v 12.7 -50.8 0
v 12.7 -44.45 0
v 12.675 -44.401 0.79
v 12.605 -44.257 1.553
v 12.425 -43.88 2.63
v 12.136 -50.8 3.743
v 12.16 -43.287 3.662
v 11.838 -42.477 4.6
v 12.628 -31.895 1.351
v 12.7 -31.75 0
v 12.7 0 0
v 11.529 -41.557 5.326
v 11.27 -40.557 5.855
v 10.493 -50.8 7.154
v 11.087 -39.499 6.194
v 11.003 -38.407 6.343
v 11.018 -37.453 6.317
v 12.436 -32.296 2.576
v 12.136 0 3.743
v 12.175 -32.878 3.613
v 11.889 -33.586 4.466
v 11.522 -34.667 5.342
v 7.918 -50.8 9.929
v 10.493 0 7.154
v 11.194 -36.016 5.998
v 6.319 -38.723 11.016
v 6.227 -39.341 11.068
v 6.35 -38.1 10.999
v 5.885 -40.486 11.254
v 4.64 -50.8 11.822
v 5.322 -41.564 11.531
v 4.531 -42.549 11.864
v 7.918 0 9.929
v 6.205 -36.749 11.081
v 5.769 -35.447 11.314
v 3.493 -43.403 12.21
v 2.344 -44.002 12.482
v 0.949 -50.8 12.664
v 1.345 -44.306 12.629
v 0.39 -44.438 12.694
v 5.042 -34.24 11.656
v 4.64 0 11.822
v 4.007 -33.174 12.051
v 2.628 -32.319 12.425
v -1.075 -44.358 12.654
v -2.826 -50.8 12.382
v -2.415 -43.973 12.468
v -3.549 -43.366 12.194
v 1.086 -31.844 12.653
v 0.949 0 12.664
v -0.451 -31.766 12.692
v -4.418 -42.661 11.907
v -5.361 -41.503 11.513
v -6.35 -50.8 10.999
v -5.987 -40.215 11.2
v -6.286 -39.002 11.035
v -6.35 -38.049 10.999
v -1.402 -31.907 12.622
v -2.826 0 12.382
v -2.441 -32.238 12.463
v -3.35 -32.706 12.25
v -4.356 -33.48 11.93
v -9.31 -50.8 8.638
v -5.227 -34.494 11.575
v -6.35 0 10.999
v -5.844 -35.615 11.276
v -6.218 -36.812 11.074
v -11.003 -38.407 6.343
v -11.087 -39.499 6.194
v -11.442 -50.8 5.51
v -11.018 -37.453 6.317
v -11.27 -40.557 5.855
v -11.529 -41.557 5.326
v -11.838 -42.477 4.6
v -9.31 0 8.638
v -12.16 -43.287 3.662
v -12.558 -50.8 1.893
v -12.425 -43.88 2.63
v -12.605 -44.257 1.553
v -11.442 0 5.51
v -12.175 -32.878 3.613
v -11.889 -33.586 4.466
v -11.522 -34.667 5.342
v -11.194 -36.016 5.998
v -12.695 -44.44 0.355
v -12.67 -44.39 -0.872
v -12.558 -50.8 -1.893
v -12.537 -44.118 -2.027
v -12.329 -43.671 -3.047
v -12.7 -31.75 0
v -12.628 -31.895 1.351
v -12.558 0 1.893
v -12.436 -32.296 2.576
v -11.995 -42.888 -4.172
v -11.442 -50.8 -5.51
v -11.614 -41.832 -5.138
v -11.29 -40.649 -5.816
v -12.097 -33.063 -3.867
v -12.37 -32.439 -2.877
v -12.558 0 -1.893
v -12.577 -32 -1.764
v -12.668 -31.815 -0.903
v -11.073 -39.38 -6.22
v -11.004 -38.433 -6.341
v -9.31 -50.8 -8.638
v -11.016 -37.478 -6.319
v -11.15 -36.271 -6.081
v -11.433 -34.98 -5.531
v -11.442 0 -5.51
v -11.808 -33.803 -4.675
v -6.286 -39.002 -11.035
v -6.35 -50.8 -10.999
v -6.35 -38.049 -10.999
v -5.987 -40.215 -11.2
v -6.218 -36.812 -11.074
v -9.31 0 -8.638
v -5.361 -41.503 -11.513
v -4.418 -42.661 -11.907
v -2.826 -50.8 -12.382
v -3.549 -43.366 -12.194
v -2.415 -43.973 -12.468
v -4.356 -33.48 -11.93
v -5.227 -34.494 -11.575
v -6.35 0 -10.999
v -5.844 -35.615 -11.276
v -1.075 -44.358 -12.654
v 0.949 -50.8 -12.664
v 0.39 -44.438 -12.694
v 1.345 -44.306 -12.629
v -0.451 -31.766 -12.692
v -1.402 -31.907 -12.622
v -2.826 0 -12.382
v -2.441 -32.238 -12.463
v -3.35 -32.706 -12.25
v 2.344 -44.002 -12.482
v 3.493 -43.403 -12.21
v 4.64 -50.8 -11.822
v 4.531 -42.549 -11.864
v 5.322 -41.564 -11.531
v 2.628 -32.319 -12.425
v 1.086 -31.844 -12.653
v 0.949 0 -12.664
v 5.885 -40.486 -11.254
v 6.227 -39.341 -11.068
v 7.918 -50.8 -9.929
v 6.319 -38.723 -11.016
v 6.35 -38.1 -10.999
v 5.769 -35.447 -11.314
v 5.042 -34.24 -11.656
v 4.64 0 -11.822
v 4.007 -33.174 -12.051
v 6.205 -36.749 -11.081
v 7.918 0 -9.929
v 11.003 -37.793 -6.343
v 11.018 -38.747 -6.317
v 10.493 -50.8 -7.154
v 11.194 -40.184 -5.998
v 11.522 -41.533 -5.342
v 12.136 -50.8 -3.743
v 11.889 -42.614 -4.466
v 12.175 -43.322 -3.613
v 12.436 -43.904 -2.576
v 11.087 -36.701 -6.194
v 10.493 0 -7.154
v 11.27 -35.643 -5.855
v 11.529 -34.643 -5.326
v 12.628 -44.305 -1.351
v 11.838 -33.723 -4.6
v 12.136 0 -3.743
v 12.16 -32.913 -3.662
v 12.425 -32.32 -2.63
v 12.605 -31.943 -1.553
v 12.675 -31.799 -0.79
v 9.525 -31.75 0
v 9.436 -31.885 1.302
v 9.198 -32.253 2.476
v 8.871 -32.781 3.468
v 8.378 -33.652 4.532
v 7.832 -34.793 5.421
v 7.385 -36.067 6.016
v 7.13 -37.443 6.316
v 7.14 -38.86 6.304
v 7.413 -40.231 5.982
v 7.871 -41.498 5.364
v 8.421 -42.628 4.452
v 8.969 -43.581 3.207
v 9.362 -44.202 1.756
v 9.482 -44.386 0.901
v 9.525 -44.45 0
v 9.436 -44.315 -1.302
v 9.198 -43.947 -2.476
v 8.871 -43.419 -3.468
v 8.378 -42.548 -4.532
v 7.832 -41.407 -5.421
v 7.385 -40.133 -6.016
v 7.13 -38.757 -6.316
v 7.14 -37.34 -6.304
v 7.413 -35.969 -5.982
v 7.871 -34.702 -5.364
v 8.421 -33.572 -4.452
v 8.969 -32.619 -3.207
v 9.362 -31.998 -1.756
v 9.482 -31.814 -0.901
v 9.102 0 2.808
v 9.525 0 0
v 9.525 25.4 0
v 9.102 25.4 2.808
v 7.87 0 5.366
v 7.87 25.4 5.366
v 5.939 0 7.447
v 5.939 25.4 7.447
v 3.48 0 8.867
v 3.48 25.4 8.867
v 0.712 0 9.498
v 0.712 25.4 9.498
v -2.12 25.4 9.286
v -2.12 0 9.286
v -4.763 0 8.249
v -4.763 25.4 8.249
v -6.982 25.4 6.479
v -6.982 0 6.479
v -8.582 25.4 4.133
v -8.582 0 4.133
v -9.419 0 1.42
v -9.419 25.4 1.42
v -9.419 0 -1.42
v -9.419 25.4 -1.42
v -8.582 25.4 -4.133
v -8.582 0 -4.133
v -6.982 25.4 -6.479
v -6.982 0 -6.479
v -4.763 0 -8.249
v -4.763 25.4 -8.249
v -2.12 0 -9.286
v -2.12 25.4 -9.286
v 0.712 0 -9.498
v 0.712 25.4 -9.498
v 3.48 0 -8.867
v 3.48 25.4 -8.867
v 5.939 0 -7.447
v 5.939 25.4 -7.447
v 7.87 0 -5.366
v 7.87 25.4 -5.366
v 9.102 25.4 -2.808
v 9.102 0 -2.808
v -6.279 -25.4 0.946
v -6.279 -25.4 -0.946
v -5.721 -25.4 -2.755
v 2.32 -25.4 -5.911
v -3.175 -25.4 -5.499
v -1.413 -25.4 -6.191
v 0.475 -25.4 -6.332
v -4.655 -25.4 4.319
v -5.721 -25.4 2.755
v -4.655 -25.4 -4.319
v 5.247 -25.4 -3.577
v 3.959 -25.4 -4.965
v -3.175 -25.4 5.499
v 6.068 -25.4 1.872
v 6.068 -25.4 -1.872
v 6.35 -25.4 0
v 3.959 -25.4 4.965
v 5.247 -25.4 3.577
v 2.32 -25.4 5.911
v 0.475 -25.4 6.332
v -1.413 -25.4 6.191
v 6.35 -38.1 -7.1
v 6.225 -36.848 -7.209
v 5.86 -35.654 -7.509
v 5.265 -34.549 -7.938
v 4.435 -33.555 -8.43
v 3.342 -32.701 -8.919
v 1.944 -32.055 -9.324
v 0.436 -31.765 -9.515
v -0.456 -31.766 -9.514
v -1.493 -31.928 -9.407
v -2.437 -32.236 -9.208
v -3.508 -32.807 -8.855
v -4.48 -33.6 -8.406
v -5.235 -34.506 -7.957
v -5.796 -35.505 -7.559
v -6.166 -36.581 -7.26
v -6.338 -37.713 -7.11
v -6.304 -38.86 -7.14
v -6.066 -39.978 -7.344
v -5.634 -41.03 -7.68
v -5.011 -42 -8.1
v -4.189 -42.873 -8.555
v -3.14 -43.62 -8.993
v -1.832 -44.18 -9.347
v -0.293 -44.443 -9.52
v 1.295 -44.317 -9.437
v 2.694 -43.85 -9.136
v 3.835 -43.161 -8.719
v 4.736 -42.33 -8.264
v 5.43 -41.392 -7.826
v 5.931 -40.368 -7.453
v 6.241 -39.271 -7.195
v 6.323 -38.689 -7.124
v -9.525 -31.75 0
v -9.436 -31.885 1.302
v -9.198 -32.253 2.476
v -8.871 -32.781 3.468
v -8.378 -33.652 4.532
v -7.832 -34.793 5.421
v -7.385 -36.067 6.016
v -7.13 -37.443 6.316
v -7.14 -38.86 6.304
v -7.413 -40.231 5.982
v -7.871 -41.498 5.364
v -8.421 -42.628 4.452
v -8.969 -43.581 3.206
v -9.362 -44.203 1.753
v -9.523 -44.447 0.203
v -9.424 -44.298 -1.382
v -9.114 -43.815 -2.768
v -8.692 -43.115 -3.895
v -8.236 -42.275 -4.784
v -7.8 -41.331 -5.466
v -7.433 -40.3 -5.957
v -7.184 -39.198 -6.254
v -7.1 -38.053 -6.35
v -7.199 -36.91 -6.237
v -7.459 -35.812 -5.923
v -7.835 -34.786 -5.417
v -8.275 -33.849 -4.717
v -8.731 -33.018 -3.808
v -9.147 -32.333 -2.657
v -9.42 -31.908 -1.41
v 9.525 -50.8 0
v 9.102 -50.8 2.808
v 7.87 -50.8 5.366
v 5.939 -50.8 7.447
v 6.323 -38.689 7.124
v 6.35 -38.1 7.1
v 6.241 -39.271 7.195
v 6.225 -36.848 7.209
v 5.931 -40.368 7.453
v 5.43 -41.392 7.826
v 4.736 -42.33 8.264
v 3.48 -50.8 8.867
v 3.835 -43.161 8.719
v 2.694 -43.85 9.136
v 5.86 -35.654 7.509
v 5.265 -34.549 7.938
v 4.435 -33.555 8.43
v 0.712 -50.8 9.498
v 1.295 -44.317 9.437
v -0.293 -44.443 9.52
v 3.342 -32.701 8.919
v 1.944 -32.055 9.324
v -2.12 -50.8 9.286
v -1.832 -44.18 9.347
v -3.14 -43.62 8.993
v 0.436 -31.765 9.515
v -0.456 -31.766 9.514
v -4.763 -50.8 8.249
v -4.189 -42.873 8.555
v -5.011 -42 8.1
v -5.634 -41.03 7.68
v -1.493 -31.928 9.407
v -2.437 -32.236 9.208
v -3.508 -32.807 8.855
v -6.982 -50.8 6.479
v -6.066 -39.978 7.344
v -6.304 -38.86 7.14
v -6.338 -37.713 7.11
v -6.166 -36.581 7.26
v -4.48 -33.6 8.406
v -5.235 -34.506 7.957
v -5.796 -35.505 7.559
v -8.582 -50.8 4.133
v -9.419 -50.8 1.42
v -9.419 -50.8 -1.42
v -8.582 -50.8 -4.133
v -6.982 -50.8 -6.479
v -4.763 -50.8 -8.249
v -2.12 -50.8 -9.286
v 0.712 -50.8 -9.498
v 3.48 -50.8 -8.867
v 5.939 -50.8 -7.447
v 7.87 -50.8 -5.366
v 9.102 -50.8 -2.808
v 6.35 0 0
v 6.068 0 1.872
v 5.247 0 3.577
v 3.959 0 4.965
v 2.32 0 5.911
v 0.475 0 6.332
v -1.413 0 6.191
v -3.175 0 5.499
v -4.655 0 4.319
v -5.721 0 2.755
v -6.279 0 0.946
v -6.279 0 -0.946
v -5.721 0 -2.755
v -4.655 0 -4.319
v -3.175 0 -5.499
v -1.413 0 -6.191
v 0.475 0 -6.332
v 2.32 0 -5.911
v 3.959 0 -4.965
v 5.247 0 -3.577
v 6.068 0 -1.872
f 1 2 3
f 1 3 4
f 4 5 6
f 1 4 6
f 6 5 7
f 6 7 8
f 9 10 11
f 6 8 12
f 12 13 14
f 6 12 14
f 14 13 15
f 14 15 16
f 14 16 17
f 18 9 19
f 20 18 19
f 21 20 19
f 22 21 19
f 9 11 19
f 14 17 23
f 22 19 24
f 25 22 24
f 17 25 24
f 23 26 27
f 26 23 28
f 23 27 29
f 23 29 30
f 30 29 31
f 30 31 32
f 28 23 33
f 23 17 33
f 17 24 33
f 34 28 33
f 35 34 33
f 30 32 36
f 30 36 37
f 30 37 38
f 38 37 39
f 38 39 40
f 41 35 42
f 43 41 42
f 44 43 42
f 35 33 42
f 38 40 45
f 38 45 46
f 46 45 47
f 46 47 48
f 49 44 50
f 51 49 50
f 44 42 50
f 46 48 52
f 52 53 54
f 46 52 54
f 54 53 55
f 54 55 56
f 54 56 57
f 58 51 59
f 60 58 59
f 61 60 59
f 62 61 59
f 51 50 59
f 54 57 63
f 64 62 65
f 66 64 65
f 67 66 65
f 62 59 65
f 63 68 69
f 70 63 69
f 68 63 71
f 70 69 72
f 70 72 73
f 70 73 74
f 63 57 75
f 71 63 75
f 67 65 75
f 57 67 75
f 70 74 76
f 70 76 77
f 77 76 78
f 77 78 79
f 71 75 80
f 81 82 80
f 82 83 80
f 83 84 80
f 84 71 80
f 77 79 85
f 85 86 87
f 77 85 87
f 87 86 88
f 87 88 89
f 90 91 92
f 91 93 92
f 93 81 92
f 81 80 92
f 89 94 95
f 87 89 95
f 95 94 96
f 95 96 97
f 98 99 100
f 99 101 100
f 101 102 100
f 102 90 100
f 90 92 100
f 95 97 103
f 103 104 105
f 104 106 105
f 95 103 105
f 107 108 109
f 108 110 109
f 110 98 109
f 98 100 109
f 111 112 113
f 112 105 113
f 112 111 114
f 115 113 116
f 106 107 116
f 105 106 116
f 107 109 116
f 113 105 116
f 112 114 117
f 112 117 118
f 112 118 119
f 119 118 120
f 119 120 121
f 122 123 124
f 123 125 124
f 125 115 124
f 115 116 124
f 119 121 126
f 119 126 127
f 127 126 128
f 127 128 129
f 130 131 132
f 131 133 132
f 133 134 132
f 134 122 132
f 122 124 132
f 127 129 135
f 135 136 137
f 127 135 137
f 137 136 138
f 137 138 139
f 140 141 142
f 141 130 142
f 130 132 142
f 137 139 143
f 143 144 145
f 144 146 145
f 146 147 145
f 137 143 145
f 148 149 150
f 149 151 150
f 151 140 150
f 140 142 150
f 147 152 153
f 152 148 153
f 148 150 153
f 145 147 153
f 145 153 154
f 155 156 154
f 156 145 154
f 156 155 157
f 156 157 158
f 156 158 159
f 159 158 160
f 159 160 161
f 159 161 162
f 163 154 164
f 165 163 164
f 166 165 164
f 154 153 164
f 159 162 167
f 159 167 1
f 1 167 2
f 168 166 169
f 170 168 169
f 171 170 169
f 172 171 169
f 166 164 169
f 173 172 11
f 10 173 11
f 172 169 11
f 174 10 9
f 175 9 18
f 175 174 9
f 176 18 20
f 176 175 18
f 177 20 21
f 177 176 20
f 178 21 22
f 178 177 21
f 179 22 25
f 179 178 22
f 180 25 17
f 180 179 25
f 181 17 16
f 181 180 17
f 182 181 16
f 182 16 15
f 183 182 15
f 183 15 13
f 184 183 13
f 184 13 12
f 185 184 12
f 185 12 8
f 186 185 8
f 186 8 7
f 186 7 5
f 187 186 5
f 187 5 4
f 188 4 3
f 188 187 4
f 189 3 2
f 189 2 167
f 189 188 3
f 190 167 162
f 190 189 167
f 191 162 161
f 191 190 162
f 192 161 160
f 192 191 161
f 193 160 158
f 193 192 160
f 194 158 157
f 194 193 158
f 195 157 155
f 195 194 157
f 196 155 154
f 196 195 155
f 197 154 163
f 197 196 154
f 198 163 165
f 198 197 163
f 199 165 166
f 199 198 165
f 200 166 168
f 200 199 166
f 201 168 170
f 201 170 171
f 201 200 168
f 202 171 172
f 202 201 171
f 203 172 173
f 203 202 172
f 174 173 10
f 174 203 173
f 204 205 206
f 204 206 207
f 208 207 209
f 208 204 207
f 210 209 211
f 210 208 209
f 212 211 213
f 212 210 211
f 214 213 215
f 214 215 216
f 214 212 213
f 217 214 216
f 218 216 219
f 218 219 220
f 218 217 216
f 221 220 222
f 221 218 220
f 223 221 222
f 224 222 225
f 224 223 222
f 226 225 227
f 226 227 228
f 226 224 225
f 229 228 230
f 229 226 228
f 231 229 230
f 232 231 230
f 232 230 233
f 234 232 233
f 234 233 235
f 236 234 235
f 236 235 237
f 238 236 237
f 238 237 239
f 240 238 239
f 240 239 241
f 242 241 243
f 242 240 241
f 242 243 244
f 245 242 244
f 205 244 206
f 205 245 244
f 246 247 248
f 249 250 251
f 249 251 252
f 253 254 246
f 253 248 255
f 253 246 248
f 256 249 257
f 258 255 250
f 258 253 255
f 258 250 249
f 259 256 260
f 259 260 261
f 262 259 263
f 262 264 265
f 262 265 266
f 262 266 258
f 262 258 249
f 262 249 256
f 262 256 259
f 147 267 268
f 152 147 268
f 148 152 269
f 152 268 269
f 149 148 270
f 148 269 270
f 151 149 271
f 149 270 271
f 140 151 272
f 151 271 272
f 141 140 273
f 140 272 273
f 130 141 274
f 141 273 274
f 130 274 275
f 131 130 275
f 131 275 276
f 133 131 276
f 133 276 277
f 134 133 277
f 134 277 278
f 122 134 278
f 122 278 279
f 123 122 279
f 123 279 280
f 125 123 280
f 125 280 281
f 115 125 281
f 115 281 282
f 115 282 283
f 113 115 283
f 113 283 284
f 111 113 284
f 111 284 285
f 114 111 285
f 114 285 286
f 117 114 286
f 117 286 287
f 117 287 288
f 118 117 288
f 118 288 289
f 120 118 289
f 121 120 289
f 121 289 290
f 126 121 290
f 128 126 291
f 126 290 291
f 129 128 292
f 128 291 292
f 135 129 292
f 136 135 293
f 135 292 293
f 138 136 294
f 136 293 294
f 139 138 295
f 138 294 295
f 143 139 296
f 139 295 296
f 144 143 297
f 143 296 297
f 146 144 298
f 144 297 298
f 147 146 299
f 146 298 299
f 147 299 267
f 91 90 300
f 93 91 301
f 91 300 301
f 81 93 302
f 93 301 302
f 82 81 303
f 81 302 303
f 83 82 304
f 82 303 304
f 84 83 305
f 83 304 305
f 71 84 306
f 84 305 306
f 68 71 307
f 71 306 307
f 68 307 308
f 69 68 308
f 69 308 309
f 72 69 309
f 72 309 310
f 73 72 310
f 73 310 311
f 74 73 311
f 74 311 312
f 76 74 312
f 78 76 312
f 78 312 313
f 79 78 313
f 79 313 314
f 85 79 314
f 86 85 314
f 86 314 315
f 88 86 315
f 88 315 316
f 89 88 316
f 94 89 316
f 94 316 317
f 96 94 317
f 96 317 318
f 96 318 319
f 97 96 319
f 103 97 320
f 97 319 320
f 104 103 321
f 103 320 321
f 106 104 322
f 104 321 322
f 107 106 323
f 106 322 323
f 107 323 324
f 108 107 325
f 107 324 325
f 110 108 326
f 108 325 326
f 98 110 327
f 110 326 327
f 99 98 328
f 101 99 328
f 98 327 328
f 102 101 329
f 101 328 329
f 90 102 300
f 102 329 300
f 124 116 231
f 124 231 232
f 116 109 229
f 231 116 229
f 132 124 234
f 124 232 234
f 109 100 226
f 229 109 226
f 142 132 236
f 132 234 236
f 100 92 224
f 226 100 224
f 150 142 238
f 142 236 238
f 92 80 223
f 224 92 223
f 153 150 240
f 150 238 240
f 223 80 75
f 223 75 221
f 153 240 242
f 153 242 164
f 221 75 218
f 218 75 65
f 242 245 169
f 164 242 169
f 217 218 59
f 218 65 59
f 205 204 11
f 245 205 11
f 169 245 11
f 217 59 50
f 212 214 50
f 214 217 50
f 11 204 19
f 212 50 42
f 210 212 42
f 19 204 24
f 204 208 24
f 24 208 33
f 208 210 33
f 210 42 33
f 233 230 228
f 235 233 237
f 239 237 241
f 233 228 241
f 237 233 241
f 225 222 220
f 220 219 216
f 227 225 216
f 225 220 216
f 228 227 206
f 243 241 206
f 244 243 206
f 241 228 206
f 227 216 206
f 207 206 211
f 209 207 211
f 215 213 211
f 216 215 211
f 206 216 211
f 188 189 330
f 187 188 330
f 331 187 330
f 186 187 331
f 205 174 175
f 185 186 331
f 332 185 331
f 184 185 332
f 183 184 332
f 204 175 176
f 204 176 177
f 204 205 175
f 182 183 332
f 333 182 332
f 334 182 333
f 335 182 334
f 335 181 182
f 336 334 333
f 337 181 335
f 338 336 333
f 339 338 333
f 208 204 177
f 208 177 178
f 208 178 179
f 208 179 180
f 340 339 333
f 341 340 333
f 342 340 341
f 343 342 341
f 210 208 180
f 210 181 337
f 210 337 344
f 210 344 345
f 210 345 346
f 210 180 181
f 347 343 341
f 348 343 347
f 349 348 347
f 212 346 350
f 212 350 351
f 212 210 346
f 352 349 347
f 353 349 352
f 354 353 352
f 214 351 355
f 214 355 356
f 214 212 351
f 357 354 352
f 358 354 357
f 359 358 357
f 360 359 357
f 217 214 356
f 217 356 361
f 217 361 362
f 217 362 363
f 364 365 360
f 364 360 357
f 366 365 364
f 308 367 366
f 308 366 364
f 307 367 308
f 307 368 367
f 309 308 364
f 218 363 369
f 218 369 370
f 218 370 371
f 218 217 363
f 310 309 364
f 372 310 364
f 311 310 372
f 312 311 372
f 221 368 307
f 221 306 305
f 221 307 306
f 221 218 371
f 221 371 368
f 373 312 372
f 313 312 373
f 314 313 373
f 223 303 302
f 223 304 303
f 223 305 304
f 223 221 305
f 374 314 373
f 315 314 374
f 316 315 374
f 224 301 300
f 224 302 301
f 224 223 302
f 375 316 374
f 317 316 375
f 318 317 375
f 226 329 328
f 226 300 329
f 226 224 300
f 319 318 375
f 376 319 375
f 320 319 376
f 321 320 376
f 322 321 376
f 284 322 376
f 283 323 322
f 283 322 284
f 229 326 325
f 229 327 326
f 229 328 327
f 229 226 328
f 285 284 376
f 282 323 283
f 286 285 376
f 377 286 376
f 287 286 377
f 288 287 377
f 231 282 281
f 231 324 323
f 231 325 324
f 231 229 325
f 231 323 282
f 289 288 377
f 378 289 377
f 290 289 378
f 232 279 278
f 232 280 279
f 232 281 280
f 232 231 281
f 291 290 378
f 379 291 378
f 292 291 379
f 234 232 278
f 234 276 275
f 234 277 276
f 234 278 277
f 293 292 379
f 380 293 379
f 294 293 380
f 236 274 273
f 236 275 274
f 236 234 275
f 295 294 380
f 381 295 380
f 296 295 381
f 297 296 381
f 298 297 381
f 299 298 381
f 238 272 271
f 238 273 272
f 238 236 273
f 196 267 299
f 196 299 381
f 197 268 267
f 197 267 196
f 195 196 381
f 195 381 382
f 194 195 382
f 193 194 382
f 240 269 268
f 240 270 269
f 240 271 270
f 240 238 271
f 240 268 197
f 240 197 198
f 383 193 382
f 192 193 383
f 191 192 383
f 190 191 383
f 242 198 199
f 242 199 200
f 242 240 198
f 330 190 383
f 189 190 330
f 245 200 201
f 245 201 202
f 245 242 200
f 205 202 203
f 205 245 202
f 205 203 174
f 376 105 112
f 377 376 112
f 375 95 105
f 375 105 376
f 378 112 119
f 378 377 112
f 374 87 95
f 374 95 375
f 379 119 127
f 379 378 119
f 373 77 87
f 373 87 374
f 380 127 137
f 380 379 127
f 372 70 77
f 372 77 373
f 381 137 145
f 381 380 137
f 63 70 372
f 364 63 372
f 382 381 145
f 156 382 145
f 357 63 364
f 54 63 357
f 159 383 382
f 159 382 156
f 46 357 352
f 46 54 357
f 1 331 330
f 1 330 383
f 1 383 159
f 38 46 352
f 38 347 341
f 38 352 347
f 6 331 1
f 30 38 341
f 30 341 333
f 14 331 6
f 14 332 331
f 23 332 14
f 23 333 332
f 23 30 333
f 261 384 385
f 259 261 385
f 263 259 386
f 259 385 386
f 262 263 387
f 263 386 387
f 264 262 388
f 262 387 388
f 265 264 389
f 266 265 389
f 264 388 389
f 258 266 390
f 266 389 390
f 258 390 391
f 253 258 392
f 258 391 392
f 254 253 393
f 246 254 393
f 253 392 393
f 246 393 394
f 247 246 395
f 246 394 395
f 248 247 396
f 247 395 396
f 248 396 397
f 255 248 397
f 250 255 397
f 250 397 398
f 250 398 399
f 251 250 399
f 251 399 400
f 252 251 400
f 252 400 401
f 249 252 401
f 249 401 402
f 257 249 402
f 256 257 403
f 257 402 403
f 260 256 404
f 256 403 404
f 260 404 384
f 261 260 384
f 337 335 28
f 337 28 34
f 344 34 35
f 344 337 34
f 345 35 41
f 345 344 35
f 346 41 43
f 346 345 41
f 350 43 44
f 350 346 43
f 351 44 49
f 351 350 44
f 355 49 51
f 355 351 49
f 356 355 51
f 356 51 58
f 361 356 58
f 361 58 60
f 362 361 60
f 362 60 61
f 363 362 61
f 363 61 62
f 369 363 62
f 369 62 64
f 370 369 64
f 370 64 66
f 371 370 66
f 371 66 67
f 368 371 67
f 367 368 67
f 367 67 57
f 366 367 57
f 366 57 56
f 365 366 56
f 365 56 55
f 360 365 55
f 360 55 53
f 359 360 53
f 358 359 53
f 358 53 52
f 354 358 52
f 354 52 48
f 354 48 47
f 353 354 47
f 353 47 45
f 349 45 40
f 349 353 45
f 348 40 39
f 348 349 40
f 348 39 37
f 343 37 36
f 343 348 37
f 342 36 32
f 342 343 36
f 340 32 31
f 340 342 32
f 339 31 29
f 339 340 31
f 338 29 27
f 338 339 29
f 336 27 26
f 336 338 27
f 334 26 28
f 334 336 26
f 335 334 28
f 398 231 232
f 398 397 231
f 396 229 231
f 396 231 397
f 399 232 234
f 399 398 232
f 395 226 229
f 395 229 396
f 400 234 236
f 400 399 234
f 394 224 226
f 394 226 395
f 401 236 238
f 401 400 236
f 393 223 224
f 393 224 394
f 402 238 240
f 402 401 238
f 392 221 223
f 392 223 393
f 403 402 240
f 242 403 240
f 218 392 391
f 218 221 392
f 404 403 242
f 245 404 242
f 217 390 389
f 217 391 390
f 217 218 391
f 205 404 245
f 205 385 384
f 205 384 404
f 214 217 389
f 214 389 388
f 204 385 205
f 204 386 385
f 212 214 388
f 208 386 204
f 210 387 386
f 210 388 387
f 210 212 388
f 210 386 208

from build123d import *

# Parameters (mm, degrees)
F0_R          = 12.7
F0_R_2        = 9.525
F1_DEPTH      = 50.8
F2_R          = 6.35
F3_DEPTH      = 12.701
F3_DEPTH_BACK = 12.701
F4_R          = 6.35
F5_DEPTH      = 12.701
F5_DEPTH_BACK = 12.701
F0_R_3        = 6.35
F6_DEPTH      = 25.4
F7_DEPTH      = 25.4


with BuildPart() as f1:
    # F0 (on Front) → F1 (new body)
    with BuildSketch(Plane.XZ):
        Circle(F0_R)
        Circle(F0_R_2, mode=Mode.SUBTRACT)
    extrude(amount=F1_DEPTH)

    # F2 (on Right) → F3 (cut, two sides)
    with BuildSketch(Plane.YZ) as f3_sk:
        with Locations((-38.1, 0)):
            Circle(F2_R)
    extrude(amount=F3_DEPTH, mode=Mode.SUBTRACT)
    extrude(f3_sk.sketch, amount=-F3_DEPTH_BACK, mode=Mode.SUBTRACT)

    # F4 (on Top) → F5 (cut, two sides)
    with BuildSketch(Plane.XY) as f5_sk:
        with Locations((0, -38.1)):
            Circle(F4_R)
    extrude(amount=F5_DEPTH, mode=Mode.SUBTRACT)
    extrude(f5_sk.sketch, amount=-F5_DEPTH_BACK, mode=Mode.SUBTRACT)


with BuildPart() as f6:
    # F0 (on Front) → F6 (new body)
    with BuildSketch(Plane.XZ):
        Circle(F0_R_2)
        Circle(F0_R_3, mode=Mode.SUBTRACT)
        Circle(F0_R_3)
    extrude(amount=-F6_DEPTH)

    # F0 (on Front) → F7 (join)
    with BuildSketch(Plane.XZ):
        Circle(F0_R_3)
    extrude(amount=F7_DEPTH)


solid = Compound([f1.part, f6.part])
